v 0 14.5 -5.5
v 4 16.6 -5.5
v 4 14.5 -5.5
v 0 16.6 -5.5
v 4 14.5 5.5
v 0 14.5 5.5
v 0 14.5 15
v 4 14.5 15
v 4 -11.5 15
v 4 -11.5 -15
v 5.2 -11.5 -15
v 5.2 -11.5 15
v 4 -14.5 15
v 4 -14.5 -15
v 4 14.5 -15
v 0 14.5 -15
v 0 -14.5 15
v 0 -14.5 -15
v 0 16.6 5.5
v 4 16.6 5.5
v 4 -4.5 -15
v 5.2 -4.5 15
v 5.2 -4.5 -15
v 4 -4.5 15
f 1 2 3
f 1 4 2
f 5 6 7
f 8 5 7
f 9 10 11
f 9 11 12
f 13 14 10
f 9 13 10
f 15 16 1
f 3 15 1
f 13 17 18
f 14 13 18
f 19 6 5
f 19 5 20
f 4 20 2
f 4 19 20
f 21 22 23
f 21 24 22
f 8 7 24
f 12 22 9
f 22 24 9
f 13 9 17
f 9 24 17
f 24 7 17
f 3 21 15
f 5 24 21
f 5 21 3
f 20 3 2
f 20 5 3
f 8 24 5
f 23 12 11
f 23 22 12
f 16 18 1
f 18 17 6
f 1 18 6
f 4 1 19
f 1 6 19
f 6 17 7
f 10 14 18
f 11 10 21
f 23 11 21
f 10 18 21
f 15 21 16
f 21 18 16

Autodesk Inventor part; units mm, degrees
ref_plane "YZ Plane" through (0, 0, 0) normal (1, 0, 0) x (0, 1, 0)
ref_plane "XZ Plane" through (0, 0, 0) normal (0, 1, 0) x (-1, 0, 0)
ref_plane "XY Plane" through (0, 0, 0) normal (0, 0, 1) x (1, 0, 0)
sketch "Náčrt1" plane through (0, 0, 0) normal (1, 0, 0) x (0, 1, 0)
  line L0 (14.5, 15) -> (-14.5, 15)
  line L1 (-14.5, 15) -> (-14.5, -15)
  line L2 (-14.5, -15) -> (14.5, -15)
  line L3 (14.5, -15) -> (14.5, 15)
  line L4 (14.5, 5.5) -> (16.6, 5.5)
  line L5 (16.6, 5.5) -> (16.6, -5.5)
  line L6 (16.6, -5.5) -> (14.5, -5.5)
  line L7 (14.5, -5.5) -> (14.5, 5.5)
  point P0 (0, 0)
  dimension "d0" = 29
  dimension "d1" = 30
  dimension "d2" = 2.1
  dimension "d3" = 11
  dimension "d4" = 15
  dimension "d5" = 14.5
  dimension "d6" = 5.5
extrude "Vysunutí1" add sketch "Náčrt1" along normal blind 4
sketch "Náčrt2" plane through (4, 0, 0) normal (1, 0, 0) x (0, 0, -1)
  line L0 (-15, -4.5) -> (15, -4.5)
  line L1 (15, -4.5) -> (15, -11.5)
  line L2 (15, -11.5) -> (-15, -11.5)
  line L3 (-15, -11.5) -> (-15, -4.5)
  line L4 (5.5, 14.5) -> (5.5, 16.6) projected
  line L5 (5.5, 16.6) -> (-5.5, 16.6) projected
  line L6 (-5.5, 16.6) -> (-5.5, 14.5) projected
  line L7 (-5.5, 14.5) -> (-15, 14.5) projected
  line L8 (-15, 14.5) -> (-15, -14.5) projected
  line L9 (-15, -14.5) -> (15, -14.5) projected
  line L10 (15, -14.5) -> (15, 14.5) projected
  line L11 (15, 14.5) -> (5.5, 14.5) projected
  line L12 (-15, 14.5) -> (-15, -14.5) projected
  line L13 (15, -14.5) -> (15, 14.5) projected
  point P0 (0, 0)
  dimension "d9" = 10
  dimension "d10" = 3
extrude "Vysunutí2" add sketch "Náčrt2" along normal blind 1.2 contours L0 L1 L2 L3
equation "\"d4\" = 0.5 * d1"
equation "\"d5\" = 0.5 * d0"
equation "\"d6\" = 0.5 * d3"
properties part number "gamma"
